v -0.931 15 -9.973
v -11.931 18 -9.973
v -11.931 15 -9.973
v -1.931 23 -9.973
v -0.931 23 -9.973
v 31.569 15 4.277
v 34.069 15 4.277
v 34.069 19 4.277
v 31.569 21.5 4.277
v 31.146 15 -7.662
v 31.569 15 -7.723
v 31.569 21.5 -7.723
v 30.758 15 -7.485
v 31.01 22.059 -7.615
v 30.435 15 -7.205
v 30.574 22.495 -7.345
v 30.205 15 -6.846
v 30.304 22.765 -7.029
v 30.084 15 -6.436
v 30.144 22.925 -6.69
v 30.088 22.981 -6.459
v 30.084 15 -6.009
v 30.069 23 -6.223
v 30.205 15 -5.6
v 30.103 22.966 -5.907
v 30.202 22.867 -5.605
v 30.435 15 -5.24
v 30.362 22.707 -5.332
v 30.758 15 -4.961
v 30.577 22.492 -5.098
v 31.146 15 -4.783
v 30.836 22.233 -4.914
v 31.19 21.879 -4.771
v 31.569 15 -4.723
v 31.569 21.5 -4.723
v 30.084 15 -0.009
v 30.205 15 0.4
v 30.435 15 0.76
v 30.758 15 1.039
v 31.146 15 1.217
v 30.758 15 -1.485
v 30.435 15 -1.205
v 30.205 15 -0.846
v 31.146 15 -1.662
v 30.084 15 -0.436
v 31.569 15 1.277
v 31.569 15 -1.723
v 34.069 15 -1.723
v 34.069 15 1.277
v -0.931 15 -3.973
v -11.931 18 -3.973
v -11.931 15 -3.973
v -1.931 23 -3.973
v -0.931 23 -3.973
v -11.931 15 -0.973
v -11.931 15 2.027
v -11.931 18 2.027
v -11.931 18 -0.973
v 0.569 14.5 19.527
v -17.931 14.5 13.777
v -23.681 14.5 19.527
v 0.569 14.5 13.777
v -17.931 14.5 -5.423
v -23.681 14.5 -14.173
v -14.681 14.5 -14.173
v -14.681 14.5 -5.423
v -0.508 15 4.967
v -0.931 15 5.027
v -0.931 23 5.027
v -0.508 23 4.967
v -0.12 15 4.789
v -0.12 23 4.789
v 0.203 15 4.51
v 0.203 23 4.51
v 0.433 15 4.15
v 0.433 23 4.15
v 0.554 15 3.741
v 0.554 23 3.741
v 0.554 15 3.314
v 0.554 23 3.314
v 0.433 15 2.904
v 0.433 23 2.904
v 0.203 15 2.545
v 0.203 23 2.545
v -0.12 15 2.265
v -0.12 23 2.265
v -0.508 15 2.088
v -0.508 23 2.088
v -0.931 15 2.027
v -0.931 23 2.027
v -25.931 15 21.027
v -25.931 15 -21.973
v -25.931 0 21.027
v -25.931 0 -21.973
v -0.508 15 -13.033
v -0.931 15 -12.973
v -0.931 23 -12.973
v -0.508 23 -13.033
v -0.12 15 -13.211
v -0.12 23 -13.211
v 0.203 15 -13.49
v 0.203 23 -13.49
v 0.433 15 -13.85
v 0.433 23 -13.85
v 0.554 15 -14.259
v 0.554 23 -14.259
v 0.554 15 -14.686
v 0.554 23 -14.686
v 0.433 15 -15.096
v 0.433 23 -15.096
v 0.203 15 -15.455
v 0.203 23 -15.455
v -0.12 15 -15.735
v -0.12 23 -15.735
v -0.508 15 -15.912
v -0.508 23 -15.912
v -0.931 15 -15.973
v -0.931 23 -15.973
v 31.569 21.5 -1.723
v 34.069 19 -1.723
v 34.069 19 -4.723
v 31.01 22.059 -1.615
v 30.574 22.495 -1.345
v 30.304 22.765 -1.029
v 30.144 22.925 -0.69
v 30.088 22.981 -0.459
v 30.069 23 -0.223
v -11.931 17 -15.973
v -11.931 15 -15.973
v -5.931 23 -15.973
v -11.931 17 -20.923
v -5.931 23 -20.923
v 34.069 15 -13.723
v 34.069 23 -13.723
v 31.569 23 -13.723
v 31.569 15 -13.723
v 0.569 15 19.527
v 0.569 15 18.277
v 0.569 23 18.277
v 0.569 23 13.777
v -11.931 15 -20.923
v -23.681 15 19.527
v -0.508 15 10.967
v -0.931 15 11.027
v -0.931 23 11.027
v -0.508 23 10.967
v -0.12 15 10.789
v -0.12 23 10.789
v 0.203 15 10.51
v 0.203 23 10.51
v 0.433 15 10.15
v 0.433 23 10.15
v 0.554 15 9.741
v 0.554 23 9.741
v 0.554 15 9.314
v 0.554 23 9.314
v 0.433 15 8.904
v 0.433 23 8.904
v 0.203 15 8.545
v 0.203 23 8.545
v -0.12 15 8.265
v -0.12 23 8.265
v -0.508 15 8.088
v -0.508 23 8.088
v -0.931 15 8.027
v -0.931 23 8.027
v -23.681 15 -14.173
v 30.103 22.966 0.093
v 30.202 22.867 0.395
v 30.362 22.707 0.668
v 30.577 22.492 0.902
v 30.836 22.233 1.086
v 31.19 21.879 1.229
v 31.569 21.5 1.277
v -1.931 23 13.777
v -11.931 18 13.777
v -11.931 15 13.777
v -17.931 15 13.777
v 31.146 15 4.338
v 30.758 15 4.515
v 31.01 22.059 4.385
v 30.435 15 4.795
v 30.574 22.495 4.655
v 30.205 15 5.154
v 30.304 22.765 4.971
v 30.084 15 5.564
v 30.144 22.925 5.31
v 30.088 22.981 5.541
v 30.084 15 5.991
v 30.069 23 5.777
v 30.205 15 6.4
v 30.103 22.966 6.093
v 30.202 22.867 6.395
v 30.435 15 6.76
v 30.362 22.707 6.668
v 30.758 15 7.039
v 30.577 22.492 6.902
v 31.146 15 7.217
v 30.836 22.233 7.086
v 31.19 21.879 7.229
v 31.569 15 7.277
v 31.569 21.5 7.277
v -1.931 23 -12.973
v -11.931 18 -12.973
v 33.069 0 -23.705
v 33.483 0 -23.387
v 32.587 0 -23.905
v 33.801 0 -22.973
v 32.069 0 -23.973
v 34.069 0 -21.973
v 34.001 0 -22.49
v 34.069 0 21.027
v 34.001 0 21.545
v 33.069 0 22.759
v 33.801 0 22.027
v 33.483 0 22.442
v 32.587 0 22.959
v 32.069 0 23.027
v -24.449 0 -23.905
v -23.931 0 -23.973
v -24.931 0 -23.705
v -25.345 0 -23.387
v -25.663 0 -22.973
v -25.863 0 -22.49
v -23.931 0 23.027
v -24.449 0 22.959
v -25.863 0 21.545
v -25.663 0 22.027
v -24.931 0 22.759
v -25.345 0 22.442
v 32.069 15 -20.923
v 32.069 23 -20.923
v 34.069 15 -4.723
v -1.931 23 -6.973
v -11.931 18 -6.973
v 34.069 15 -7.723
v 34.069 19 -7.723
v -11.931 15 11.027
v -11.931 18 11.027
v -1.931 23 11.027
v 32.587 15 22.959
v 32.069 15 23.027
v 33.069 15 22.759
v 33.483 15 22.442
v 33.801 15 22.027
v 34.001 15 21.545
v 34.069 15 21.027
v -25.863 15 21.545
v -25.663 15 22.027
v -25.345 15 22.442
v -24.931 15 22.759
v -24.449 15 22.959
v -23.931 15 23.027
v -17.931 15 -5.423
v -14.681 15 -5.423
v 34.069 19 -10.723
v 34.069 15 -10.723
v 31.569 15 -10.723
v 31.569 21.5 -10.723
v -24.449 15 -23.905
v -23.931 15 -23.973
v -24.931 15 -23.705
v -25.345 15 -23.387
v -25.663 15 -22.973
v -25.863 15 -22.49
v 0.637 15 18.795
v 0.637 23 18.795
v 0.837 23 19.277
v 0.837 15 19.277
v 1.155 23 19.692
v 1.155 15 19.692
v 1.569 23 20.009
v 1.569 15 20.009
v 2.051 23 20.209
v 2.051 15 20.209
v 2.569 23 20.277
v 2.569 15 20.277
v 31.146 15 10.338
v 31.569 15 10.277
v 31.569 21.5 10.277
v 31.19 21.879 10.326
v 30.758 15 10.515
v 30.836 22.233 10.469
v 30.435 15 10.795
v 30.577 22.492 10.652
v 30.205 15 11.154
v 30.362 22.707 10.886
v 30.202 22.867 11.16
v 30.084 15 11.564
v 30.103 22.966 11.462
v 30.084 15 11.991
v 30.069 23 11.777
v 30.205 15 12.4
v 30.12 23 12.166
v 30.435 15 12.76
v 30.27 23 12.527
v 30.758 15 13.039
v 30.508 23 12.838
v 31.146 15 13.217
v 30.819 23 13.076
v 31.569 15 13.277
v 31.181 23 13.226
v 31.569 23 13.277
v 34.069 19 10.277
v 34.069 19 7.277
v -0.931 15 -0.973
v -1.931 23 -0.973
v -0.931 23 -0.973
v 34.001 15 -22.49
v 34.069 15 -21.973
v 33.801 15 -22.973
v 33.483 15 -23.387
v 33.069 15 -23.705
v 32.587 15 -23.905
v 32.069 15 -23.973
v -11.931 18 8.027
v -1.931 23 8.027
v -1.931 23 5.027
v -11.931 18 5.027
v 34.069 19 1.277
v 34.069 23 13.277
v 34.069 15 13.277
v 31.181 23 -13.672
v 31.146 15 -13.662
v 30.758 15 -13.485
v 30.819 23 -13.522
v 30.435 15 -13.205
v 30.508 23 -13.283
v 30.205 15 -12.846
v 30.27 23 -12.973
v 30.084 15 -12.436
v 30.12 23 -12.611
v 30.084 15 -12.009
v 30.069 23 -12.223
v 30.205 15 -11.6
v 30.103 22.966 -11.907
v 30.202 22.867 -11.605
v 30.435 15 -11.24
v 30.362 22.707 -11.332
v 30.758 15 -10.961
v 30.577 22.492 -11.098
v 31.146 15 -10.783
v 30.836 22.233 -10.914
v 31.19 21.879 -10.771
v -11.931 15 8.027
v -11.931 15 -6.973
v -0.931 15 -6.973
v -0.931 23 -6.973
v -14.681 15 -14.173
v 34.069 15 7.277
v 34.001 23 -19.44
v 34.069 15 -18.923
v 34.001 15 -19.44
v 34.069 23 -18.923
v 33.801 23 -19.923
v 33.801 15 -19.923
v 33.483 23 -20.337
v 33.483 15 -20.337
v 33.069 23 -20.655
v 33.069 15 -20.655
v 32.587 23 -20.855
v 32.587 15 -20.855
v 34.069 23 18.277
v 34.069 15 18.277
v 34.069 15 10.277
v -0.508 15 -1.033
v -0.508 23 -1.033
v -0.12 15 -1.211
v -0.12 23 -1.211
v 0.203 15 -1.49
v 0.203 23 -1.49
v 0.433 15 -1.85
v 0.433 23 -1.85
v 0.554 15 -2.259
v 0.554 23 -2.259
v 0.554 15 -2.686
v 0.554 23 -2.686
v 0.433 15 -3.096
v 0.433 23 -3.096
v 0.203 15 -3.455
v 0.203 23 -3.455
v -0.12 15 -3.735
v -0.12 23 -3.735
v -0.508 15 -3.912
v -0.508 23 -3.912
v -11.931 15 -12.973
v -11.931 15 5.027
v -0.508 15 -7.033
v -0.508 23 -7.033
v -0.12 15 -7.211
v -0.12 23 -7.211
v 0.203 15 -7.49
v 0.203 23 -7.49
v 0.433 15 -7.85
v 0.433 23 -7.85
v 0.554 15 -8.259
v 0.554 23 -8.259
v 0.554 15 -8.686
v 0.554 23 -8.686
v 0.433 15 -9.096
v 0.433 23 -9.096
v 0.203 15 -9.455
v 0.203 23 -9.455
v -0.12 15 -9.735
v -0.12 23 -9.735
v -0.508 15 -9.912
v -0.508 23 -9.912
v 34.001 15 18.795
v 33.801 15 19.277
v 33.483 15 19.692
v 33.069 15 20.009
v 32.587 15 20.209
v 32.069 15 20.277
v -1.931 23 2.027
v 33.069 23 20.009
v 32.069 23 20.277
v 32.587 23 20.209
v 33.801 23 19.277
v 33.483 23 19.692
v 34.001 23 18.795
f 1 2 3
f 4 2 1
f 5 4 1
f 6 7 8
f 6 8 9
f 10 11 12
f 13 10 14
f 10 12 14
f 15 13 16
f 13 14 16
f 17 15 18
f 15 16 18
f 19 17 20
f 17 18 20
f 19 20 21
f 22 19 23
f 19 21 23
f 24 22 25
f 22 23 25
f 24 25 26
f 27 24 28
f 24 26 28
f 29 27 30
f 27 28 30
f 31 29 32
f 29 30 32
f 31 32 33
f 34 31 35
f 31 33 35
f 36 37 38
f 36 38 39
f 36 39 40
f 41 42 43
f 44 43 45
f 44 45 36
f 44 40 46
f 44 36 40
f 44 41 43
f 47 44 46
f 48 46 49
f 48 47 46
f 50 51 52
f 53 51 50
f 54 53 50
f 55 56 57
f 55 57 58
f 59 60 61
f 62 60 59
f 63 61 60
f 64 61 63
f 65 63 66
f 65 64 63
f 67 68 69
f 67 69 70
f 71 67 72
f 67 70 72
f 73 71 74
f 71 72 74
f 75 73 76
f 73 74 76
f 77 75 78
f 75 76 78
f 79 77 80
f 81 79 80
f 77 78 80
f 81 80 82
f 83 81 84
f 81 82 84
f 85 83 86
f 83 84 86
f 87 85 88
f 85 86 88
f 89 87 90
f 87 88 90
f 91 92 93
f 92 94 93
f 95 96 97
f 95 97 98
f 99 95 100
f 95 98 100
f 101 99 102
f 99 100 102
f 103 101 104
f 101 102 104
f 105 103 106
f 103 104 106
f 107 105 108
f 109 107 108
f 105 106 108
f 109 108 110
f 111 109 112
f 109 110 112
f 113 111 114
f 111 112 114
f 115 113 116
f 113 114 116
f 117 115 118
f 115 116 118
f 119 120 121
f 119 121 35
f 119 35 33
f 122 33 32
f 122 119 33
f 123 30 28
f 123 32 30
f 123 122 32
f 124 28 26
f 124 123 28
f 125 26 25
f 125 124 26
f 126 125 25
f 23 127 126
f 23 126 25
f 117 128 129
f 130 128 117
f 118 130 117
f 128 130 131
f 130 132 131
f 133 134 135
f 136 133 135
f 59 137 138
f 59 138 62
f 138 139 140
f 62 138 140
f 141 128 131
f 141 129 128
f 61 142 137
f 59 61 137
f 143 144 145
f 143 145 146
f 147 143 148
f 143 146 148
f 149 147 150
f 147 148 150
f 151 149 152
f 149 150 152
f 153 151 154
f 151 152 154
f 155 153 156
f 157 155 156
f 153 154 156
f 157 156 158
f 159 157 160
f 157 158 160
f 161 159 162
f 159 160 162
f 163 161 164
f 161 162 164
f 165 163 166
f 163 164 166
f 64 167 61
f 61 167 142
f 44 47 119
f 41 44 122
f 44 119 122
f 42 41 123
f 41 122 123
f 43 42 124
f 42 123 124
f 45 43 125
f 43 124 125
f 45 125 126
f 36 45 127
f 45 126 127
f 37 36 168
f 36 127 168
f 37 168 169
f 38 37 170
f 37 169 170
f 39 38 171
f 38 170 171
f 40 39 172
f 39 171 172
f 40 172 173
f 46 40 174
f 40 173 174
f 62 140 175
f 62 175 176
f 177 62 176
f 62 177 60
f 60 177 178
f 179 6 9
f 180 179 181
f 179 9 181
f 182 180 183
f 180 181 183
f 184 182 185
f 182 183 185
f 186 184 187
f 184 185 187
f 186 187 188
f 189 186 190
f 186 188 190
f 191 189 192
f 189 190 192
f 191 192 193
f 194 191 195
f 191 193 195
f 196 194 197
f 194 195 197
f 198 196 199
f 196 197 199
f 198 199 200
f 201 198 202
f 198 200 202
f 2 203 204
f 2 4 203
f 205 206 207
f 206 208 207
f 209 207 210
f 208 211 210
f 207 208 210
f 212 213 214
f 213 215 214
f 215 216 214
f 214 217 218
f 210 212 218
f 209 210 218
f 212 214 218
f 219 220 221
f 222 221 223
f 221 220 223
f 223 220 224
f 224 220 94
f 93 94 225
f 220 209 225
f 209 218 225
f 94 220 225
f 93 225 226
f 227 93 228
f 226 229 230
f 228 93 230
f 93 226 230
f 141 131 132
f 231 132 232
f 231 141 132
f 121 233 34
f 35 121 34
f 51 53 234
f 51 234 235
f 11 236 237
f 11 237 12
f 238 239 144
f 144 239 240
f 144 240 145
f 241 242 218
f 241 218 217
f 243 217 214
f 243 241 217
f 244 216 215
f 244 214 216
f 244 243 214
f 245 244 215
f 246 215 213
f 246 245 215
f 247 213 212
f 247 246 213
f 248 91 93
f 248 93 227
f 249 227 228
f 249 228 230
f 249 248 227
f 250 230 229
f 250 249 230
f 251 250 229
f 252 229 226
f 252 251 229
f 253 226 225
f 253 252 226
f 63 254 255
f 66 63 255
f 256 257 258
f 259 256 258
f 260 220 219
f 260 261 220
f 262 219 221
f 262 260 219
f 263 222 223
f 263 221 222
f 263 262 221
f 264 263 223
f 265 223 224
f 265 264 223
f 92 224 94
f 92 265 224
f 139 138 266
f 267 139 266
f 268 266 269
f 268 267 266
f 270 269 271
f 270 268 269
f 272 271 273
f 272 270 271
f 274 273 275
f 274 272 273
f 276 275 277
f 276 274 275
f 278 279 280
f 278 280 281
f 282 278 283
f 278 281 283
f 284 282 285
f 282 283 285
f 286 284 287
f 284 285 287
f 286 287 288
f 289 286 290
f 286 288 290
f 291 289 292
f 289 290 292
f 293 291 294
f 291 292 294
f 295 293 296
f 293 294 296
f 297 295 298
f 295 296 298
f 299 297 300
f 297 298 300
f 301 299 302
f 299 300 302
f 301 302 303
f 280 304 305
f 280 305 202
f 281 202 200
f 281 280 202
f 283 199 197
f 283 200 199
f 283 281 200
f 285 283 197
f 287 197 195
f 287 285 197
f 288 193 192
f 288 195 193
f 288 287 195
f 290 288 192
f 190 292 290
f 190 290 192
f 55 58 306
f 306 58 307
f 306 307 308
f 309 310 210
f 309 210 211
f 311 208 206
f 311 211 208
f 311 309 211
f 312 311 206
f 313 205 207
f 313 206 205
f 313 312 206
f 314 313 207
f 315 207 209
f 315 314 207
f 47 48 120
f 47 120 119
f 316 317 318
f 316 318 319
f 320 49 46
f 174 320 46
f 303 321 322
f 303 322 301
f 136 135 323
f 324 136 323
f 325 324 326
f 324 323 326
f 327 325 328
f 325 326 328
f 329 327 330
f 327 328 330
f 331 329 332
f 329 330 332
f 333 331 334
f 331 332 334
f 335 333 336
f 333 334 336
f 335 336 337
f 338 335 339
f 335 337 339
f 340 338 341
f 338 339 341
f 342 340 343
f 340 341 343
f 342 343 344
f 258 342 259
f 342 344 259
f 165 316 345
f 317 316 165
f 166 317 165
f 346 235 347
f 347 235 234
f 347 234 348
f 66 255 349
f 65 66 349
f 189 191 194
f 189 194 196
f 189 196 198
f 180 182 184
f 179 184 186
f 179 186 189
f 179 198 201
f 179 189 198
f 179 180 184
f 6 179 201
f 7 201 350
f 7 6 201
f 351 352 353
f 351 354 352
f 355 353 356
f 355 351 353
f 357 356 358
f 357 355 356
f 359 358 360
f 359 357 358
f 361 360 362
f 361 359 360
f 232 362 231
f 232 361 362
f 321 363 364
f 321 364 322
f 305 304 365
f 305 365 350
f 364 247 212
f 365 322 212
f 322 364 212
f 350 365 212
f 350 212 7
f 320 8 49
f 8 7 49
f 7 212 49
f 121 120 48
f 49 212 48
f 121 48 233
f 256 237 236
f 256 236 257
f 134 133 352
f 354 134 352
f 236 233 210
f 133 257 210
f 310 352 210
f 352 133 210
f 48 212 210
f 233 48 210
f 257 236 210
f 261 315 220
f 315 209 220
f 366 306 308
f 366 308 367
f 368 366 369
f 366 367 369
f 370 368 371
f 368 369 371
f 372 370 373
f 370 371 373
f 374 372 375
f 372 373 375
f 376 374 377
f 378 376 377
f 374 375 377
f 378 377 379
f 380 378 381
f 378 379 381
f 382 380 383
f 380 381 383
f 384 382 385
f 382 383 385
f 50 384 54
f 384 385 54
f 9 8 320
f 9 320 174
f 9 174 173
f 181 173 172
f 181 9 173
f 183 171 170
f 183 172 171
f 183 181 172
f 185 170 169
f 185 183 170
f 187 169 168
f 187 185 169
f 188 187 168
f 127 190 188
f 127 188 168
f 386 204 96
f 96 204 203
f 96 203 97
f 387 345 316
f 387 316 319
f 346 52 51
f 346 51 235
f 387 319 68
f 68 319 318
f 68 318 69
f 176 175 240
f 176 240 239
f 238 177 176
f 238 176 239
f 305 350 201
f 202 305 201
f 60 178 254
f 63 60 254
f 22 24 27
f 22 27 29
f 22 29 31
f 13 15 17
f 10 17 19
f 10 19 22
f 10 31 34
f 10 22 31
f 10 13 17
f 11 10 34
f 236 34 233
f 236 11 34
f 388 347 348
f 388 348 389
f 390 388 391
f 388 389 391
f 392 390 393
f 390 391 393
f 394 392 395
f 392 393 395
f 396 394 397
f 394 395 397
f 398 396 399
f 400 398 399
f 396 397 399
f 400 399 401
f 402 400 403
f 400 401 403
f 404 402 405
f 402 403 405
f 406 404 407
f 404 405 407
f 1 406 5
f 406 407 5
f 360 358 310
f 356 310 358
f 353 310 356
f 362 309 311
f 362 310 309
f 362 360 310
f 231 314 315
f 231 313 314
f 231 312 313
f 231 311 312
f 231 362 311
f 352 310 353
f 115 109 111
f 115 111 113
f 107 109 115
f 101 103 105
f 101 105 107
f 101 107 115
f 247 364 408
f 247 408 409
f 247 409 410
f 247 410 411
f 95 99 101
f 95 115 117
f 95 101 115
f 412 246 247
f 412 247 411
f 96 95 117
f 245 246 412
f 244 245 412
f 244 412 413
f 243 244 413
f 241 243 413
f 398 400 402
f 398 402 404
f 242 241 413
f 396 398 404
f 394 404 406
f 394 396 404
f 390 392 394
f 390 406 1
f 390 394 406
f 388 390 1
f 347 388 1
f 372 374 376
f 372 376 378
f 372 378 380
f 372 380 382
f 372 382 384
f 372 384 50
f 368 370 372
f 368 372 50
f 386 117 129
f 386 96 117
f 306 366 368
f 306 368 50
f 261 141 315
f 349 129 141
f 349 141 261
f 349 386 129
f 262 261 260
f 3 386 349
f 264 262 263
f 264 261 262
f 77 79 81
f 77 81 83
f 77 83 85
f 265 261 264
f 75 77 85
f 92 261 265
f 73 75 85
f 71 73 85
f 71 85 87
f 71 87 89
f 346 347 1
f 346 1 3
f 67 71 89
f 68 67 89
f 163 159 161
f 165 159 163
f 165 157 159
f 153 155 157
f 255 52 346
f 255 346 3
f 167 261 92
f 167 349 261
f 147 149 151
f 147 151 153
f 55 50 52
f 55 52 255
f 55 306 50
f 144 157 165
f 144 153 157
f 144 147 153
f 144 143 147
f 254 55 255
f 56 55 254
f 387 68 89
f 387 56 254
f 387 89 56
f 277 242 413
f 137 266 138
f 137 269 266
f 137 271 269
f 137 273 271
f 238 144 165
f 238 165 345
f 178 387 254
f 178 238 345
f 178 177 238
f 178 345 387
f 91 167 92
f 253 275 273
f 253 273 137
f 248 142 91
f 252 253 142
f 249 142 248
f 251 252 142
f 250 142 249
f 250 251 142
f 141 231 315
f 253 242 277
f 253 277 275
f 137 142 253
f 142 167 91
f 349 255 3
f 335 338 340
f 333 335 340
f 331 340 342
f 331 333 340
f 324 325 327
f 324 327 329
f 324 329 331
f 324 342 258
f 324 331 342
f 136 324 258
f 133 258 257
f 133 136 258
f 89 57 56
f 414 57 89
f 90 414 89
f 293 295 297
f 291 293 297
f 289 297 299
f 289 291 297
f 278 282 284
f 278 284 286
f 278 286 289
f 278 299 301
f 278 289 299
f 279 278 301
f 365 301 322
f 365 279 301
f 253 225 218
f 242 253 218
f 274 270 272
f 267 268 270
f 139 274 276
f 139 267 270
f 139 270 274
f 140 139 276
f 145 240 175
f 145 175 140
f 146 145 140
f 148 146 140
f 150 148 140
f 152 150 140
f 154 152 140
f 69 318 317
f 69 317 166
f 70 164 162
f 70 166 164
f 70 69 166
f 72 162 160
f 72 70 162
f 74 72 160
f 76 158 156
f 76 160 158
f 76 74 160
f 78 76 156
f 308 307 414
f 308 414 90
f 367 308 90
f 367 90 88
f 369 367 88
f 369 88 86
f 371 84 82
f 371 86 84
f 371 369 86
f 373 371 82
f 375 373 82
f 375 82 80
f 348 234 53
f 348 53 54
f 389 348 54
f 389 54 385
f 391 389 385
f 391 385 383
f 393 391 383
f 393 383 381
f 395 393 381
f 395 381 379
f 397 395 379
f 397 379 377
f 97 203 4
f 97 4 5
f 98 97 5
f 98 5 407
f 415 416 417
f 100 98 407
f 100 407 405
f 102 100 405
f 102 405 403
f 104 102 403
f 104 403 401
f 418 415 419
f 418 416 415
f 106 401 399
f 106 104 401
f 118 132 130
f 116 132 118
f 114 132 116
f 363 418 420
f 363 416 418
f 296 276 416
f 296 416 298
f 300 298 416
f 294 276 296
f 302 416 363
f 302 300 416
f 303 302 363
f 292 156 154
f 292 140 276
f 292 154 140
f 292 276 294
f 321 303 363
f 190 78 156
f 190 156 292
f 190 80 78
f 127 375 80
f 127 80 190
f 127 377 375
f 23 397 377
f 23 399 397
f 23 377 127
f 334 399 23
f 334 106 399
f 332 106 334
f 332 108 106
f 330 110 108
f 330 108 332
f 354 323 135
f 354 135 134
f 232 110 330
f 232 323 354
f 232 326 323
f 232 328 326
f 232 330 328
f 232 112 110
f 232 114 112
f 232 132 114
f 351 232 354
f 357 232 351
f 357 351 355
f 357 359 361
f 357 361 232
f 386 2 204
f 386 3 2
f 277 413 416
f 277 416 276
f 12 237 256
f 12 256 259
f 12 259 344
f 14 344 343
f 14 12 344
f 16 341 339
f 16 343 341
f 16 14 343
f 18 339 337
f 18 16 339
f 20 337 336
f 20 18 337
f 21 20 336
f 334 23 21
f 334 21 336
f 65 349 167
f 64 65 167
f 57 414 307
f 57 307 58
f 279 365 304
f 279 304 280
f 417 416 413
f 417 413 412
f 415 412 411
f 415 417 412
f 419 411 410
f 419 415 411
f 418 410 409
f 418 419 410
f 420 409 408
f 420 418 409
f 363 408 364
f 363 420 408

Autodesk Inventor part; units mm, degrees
ref_plane "YZ Plane" through (0, 0, 0) normal (1, 0, 0) x (0, 1, 0)
ref_plane "XZ Plane" through (0, 0, 0) normal (0, 1, 0) x (-1, 0, 0)
ref_plane "XY Plane" through (0, 0, 0) normal (0, 0, 1) x (1, 0, 0)
sketch "Sketch1" plane through (0, 0, 0) normal (0, 1, 0) x (-1, 0, 0)
  line L0 (25.931, 23.0273) -> (-34.069, 23.0273)
  line L1 (-34.069, 23.0273) -> (-34.069, -23.9727)
  line L2 (-34.069, -23.9727) -> (25.931, -23.9727)
  line L3 (25.931, -23.9727) -> (25.931, 23.0273)
  point P0 (0, 0)
  dimension "d0" = 47
  dimension "d1" = 60
extrude "Extrusion1" add sketch "Sketch1" along normal blind 15
fillet "Fillet1" radius 2 4 edges at (34.069, 7.5, 23.0273) (34.069, 7.5, -23.9727) (-25.931, 7.5, 23.0273) (-25.931, 7.5, -23.9727)
sketch "Sketch2" plane through (0, 15, 0) normal (0, 1, 0) x (1, 0, 0)
  arc A0 (34.069, 21.9727) -> (32.069, 23.9727) centre (32.069, 21.9727) ccw projected
  line L0 (34.069, -20.2773) -> (0.569, -20.2773)
  line L1 (0.569, -20.2773) -> (0.569, -13.7773)
  line L2 (0.569, -13.7773) -> (-11.931, -13.7773)
  line L3 (-11.931, -13.7773) -> (-11.931, 20.9227)
  line L4 (34.069, -20.2773) -> (34.069, 20.9227)
  line L5 (34.069, -21.0273) -> (34.069, 21.9727) projected
  line L6 (-11.931, 20.9227) -> (34.069, 20.9227)
  line L7 (-23.931, -23.0273) -> (32.069, -23.0273) projected
  point P0 (0, 0)
  dimension "d5" = 33.5
  dimension "d6" = 41.2
  dimension "d7" = 2.75
  dimension "d8" = 6.5
  dimension "d9" = 46
extrude "Extrusion2" add sketch "Sketch2" along normal blind 8
fillet "Fillet2" radius 2 3 edges at (34.069, 19, -20.9227) (34.069, 19, 20.2773) (0.569, 19, 20.2773)
sketch "Sketch3" plane through (-11.931, 15, 13.7773) normal (0, 0, 1) x (1, 0, 0)
  line L0 (44, 8) -> (0, 8) projected
  line L1 (10, 8) -> (0, 8)
  line L2 (0, 0) -> (0, 8) projected
  line L3 (10, 8) -> (0, 3)
  line L4 (0, 0) -> (0, 8) projected
  line L5 (-12, 0) -> (44, 0) projected
  point P0 (11.931, -15)
  dimension "d13" = 10
  dimension "d14" = 3
extrude "Extrusion3" cut sketch "Sketch3" against normal blind 27
sketch "Sketch4" plane through (-11.931, 15, -20.9227) normal (0, 0, -1) x (-1, 0, 0)
  line L0 (-44, 8) -> (0, 8) projected
  line L1 (-6, 8) -> (0, 2)
  line L2 (0, 0) -> (0, 8) projected
  point P0 (-11.931, -15)
  dimension "d17" = 6
  dimension "d18" = 6
extrude "Extrusion4" cut sketch "Sketch4" against normal blind 5
sketch "Sketch5" plane through (0, 23, 0) normal (0, 1, 0) x (1, 0, 0)
  line L0 (-11.931, -13.7773) -> (-11.931, 13.2227) projected
  line L1 (-11.931, -11.0273) -> (-0.931, -11.0273)
  line L2 (-11.931, -8.0273) -> (-0.931, -8.0273)
  arc A0 (-0.931, -11.0273) -> (-0.931, -8.0273) centre (-0.931, -9.5273) ccw
  line L3 (-1.931, -13.7773) -> (-11.931, -13.7773) projected
  line L4 (-11.931, -2.0273) -> (-0.931, -2.0273)
  arc A1 (-0.931, -5.0273) -> (-0.931, -2.0273) centre (-0.931, -3.5273) ccw
  line L5 (-11.931, -5.0273) -> (-0.931, -5.0273)
  line L6 (-11.931, 3.9727) -> (-0.931, 3.9727)
  arc A2 (-0.931, 0.9727) -> (-0.931, 3.9727) centre (-0.931, 2.4727) ccw
  line L7 (-11.931, 0.9727) -> (-0.931, 0.9727)
  line L8 (-11.931, 9.9727) -> (-0.931, 9.9727)
  arc A3 (-0.931, 6.9727) -> (-0.931, 9.9727) centre (-0.931, 8.4727) ccw
  line L9 (-11.931, 6.9727) -> (-0.931, 6.9727)
  line L10 (-11.931, 15.9727) -> (-0.931, 15.9727)
  arc A4 (-0.931, 12.9727) -> (-0.931, 15.9727) centre (-0.931, 14.4727) ccw
  line L11 (-11.931, 12.9727) -> (-0.931, 12.9727)
  line L12 (-11.931, 15.9227) -> (-11.931, 13.2227) projected
  line L13 (-11.931, 15.9727) -> (-11.931, 12.9727)
  point P0 (0, 0)
  dimension "d21" = 3
  dimension "d22" = 1.5
  dimension "d23" = 2.75
  dimension "d24" = 11
  dimension "d27" = 6
extrude "Extrusion5" cut sketch "Sketch5" against normal blind 8
sketch "Sketch6" plane through (0, 23, 0) normal (0, 1, 0) x (1, 0, 0)
  line L0 (34.069, -18.2773) -> (34.069, 18.9227) projected
  line L1 (34.069, -13.2773) -> (31.569, -13.2773)
  line L2 (34.069, -10.2773) -> (31.569, -10.2773)
  arc A0 (31.569, -10.2773) -> (31.569, -13.2773) centre (31.569, -11.7773) ccw
  line L3 (2.569, -20.2773) -> (32.069, -20.2773) projected
  line L4 (34.069, -4.2773) -> (31.569, -4.2773)
  arc A1 (31.569, -4.2773) -> (31.569, -7.2773) centre (31.569, -5.7773) ccw
  line L5 (34.069, -7.2773) -> (31.569, -7.2773)
  line L6 (34.069, 1.7227) -> (31.569, 1.7227)
  arc A2 (31.569, 1.7227) -> (31.569, -1.2773) centre (31.569, 0.2227) ccw
  line L7 (34.069, -1.2773) -> (31.569, -1.2773)
  line L8 (34.069, 7.7227) -> (31.569, 7.7227)
  arc A3 (31.569, 7.7227) -> (31.569, 4.7227) centre (31.569, 6.2227) ccw
  line L9 (34.069, 4.7227) -> (31.569, 4.7227)
  line L10 (34.069, 13.7227) -> (31.569, 13.7227)
  arc A4 (31.569, 13.7227) -> (31.569, 10.7227) centre (31.569, 12.2227) ccw
  line L11 (34.069, 10.7227) -> (31.569, 10.7227)
  point P0 (0, 0)
  dimension "d35" = 1.5
  dimension "d36" = 3
  dimension "d37" = 2.5
  dimension "d38" = 7
  dimension "d41" = 6
extrude "Extrusion6" cut sketch "Sketch6" against normal blind 8
sketch "Sketch7" plane through (31.569, 23, 10.2773) normal (0, 0, 1) x (1, 0, 0)
  line L0 (-1.5, 0) -> (0, 0) projected
  line L1 (2.5, -8) -> (2.5, 0) projected
  line L2 (2.5, 0) -> (0, 0) projected
  line L3 (2.5, -4) -> (-1.5, 0)
  point P0 (-31.569, -23)
  dimension "d52" = 4
  dimension "d53" = 4
extrude "Extrusion7" cut sketch "Sketch7" against normal blind 22.5
extrude "Extrusion8" cut sketch "Sketch7" along normal blind 1.5
sketch "Sketch9" plane through (0, 15, 0) normal (0, 1, 0) x (1, 0, 0)
  line L0 (-14.681, 14.1727) -> (-23.681, 14.1727)
  line L1 (-23.681, 14.1727) -> (-23.681, -19.5273)
  line L2 (-23.681, -19.5273) -> (0.569, -19.5273)
  line L3 (0.569, -19.5273) -> (0.569, -13.7773)
  line L4 (0.569, -13.7773) -> (-17.931, -13.7773)
  line L5 (-17.931, -13.7773) -> (-17.931, 5.4227)
  line L6 (-17.931, 5.4227) -> (-14.681, 5.4227)
  line L7 (-14.681, 5.4227) -> (-14.681, 14.1727)
  line L8 (-25.931, 21.9727) -> (-25.931, -21.0273) projected
  line L9 (-23.931, -23.0273) -> (32.069, -23.0273) projected
  point P0 (0, 0)
  dimension "d58" = 9
  dimension "d59" = 5.75
  dimension "d60" = 24.25
  dimension "d61" = 33.7
  dimension "d62" = 8.75
  dimension "d63" = 2.25
  dimension "d64" = 3.5
  dimension "d65" = 5.75
extrude "Extrusion9" cut sketch "Sketch9" against normal blind 0.5
properties part number "Motor-controlling" material "Steel"
